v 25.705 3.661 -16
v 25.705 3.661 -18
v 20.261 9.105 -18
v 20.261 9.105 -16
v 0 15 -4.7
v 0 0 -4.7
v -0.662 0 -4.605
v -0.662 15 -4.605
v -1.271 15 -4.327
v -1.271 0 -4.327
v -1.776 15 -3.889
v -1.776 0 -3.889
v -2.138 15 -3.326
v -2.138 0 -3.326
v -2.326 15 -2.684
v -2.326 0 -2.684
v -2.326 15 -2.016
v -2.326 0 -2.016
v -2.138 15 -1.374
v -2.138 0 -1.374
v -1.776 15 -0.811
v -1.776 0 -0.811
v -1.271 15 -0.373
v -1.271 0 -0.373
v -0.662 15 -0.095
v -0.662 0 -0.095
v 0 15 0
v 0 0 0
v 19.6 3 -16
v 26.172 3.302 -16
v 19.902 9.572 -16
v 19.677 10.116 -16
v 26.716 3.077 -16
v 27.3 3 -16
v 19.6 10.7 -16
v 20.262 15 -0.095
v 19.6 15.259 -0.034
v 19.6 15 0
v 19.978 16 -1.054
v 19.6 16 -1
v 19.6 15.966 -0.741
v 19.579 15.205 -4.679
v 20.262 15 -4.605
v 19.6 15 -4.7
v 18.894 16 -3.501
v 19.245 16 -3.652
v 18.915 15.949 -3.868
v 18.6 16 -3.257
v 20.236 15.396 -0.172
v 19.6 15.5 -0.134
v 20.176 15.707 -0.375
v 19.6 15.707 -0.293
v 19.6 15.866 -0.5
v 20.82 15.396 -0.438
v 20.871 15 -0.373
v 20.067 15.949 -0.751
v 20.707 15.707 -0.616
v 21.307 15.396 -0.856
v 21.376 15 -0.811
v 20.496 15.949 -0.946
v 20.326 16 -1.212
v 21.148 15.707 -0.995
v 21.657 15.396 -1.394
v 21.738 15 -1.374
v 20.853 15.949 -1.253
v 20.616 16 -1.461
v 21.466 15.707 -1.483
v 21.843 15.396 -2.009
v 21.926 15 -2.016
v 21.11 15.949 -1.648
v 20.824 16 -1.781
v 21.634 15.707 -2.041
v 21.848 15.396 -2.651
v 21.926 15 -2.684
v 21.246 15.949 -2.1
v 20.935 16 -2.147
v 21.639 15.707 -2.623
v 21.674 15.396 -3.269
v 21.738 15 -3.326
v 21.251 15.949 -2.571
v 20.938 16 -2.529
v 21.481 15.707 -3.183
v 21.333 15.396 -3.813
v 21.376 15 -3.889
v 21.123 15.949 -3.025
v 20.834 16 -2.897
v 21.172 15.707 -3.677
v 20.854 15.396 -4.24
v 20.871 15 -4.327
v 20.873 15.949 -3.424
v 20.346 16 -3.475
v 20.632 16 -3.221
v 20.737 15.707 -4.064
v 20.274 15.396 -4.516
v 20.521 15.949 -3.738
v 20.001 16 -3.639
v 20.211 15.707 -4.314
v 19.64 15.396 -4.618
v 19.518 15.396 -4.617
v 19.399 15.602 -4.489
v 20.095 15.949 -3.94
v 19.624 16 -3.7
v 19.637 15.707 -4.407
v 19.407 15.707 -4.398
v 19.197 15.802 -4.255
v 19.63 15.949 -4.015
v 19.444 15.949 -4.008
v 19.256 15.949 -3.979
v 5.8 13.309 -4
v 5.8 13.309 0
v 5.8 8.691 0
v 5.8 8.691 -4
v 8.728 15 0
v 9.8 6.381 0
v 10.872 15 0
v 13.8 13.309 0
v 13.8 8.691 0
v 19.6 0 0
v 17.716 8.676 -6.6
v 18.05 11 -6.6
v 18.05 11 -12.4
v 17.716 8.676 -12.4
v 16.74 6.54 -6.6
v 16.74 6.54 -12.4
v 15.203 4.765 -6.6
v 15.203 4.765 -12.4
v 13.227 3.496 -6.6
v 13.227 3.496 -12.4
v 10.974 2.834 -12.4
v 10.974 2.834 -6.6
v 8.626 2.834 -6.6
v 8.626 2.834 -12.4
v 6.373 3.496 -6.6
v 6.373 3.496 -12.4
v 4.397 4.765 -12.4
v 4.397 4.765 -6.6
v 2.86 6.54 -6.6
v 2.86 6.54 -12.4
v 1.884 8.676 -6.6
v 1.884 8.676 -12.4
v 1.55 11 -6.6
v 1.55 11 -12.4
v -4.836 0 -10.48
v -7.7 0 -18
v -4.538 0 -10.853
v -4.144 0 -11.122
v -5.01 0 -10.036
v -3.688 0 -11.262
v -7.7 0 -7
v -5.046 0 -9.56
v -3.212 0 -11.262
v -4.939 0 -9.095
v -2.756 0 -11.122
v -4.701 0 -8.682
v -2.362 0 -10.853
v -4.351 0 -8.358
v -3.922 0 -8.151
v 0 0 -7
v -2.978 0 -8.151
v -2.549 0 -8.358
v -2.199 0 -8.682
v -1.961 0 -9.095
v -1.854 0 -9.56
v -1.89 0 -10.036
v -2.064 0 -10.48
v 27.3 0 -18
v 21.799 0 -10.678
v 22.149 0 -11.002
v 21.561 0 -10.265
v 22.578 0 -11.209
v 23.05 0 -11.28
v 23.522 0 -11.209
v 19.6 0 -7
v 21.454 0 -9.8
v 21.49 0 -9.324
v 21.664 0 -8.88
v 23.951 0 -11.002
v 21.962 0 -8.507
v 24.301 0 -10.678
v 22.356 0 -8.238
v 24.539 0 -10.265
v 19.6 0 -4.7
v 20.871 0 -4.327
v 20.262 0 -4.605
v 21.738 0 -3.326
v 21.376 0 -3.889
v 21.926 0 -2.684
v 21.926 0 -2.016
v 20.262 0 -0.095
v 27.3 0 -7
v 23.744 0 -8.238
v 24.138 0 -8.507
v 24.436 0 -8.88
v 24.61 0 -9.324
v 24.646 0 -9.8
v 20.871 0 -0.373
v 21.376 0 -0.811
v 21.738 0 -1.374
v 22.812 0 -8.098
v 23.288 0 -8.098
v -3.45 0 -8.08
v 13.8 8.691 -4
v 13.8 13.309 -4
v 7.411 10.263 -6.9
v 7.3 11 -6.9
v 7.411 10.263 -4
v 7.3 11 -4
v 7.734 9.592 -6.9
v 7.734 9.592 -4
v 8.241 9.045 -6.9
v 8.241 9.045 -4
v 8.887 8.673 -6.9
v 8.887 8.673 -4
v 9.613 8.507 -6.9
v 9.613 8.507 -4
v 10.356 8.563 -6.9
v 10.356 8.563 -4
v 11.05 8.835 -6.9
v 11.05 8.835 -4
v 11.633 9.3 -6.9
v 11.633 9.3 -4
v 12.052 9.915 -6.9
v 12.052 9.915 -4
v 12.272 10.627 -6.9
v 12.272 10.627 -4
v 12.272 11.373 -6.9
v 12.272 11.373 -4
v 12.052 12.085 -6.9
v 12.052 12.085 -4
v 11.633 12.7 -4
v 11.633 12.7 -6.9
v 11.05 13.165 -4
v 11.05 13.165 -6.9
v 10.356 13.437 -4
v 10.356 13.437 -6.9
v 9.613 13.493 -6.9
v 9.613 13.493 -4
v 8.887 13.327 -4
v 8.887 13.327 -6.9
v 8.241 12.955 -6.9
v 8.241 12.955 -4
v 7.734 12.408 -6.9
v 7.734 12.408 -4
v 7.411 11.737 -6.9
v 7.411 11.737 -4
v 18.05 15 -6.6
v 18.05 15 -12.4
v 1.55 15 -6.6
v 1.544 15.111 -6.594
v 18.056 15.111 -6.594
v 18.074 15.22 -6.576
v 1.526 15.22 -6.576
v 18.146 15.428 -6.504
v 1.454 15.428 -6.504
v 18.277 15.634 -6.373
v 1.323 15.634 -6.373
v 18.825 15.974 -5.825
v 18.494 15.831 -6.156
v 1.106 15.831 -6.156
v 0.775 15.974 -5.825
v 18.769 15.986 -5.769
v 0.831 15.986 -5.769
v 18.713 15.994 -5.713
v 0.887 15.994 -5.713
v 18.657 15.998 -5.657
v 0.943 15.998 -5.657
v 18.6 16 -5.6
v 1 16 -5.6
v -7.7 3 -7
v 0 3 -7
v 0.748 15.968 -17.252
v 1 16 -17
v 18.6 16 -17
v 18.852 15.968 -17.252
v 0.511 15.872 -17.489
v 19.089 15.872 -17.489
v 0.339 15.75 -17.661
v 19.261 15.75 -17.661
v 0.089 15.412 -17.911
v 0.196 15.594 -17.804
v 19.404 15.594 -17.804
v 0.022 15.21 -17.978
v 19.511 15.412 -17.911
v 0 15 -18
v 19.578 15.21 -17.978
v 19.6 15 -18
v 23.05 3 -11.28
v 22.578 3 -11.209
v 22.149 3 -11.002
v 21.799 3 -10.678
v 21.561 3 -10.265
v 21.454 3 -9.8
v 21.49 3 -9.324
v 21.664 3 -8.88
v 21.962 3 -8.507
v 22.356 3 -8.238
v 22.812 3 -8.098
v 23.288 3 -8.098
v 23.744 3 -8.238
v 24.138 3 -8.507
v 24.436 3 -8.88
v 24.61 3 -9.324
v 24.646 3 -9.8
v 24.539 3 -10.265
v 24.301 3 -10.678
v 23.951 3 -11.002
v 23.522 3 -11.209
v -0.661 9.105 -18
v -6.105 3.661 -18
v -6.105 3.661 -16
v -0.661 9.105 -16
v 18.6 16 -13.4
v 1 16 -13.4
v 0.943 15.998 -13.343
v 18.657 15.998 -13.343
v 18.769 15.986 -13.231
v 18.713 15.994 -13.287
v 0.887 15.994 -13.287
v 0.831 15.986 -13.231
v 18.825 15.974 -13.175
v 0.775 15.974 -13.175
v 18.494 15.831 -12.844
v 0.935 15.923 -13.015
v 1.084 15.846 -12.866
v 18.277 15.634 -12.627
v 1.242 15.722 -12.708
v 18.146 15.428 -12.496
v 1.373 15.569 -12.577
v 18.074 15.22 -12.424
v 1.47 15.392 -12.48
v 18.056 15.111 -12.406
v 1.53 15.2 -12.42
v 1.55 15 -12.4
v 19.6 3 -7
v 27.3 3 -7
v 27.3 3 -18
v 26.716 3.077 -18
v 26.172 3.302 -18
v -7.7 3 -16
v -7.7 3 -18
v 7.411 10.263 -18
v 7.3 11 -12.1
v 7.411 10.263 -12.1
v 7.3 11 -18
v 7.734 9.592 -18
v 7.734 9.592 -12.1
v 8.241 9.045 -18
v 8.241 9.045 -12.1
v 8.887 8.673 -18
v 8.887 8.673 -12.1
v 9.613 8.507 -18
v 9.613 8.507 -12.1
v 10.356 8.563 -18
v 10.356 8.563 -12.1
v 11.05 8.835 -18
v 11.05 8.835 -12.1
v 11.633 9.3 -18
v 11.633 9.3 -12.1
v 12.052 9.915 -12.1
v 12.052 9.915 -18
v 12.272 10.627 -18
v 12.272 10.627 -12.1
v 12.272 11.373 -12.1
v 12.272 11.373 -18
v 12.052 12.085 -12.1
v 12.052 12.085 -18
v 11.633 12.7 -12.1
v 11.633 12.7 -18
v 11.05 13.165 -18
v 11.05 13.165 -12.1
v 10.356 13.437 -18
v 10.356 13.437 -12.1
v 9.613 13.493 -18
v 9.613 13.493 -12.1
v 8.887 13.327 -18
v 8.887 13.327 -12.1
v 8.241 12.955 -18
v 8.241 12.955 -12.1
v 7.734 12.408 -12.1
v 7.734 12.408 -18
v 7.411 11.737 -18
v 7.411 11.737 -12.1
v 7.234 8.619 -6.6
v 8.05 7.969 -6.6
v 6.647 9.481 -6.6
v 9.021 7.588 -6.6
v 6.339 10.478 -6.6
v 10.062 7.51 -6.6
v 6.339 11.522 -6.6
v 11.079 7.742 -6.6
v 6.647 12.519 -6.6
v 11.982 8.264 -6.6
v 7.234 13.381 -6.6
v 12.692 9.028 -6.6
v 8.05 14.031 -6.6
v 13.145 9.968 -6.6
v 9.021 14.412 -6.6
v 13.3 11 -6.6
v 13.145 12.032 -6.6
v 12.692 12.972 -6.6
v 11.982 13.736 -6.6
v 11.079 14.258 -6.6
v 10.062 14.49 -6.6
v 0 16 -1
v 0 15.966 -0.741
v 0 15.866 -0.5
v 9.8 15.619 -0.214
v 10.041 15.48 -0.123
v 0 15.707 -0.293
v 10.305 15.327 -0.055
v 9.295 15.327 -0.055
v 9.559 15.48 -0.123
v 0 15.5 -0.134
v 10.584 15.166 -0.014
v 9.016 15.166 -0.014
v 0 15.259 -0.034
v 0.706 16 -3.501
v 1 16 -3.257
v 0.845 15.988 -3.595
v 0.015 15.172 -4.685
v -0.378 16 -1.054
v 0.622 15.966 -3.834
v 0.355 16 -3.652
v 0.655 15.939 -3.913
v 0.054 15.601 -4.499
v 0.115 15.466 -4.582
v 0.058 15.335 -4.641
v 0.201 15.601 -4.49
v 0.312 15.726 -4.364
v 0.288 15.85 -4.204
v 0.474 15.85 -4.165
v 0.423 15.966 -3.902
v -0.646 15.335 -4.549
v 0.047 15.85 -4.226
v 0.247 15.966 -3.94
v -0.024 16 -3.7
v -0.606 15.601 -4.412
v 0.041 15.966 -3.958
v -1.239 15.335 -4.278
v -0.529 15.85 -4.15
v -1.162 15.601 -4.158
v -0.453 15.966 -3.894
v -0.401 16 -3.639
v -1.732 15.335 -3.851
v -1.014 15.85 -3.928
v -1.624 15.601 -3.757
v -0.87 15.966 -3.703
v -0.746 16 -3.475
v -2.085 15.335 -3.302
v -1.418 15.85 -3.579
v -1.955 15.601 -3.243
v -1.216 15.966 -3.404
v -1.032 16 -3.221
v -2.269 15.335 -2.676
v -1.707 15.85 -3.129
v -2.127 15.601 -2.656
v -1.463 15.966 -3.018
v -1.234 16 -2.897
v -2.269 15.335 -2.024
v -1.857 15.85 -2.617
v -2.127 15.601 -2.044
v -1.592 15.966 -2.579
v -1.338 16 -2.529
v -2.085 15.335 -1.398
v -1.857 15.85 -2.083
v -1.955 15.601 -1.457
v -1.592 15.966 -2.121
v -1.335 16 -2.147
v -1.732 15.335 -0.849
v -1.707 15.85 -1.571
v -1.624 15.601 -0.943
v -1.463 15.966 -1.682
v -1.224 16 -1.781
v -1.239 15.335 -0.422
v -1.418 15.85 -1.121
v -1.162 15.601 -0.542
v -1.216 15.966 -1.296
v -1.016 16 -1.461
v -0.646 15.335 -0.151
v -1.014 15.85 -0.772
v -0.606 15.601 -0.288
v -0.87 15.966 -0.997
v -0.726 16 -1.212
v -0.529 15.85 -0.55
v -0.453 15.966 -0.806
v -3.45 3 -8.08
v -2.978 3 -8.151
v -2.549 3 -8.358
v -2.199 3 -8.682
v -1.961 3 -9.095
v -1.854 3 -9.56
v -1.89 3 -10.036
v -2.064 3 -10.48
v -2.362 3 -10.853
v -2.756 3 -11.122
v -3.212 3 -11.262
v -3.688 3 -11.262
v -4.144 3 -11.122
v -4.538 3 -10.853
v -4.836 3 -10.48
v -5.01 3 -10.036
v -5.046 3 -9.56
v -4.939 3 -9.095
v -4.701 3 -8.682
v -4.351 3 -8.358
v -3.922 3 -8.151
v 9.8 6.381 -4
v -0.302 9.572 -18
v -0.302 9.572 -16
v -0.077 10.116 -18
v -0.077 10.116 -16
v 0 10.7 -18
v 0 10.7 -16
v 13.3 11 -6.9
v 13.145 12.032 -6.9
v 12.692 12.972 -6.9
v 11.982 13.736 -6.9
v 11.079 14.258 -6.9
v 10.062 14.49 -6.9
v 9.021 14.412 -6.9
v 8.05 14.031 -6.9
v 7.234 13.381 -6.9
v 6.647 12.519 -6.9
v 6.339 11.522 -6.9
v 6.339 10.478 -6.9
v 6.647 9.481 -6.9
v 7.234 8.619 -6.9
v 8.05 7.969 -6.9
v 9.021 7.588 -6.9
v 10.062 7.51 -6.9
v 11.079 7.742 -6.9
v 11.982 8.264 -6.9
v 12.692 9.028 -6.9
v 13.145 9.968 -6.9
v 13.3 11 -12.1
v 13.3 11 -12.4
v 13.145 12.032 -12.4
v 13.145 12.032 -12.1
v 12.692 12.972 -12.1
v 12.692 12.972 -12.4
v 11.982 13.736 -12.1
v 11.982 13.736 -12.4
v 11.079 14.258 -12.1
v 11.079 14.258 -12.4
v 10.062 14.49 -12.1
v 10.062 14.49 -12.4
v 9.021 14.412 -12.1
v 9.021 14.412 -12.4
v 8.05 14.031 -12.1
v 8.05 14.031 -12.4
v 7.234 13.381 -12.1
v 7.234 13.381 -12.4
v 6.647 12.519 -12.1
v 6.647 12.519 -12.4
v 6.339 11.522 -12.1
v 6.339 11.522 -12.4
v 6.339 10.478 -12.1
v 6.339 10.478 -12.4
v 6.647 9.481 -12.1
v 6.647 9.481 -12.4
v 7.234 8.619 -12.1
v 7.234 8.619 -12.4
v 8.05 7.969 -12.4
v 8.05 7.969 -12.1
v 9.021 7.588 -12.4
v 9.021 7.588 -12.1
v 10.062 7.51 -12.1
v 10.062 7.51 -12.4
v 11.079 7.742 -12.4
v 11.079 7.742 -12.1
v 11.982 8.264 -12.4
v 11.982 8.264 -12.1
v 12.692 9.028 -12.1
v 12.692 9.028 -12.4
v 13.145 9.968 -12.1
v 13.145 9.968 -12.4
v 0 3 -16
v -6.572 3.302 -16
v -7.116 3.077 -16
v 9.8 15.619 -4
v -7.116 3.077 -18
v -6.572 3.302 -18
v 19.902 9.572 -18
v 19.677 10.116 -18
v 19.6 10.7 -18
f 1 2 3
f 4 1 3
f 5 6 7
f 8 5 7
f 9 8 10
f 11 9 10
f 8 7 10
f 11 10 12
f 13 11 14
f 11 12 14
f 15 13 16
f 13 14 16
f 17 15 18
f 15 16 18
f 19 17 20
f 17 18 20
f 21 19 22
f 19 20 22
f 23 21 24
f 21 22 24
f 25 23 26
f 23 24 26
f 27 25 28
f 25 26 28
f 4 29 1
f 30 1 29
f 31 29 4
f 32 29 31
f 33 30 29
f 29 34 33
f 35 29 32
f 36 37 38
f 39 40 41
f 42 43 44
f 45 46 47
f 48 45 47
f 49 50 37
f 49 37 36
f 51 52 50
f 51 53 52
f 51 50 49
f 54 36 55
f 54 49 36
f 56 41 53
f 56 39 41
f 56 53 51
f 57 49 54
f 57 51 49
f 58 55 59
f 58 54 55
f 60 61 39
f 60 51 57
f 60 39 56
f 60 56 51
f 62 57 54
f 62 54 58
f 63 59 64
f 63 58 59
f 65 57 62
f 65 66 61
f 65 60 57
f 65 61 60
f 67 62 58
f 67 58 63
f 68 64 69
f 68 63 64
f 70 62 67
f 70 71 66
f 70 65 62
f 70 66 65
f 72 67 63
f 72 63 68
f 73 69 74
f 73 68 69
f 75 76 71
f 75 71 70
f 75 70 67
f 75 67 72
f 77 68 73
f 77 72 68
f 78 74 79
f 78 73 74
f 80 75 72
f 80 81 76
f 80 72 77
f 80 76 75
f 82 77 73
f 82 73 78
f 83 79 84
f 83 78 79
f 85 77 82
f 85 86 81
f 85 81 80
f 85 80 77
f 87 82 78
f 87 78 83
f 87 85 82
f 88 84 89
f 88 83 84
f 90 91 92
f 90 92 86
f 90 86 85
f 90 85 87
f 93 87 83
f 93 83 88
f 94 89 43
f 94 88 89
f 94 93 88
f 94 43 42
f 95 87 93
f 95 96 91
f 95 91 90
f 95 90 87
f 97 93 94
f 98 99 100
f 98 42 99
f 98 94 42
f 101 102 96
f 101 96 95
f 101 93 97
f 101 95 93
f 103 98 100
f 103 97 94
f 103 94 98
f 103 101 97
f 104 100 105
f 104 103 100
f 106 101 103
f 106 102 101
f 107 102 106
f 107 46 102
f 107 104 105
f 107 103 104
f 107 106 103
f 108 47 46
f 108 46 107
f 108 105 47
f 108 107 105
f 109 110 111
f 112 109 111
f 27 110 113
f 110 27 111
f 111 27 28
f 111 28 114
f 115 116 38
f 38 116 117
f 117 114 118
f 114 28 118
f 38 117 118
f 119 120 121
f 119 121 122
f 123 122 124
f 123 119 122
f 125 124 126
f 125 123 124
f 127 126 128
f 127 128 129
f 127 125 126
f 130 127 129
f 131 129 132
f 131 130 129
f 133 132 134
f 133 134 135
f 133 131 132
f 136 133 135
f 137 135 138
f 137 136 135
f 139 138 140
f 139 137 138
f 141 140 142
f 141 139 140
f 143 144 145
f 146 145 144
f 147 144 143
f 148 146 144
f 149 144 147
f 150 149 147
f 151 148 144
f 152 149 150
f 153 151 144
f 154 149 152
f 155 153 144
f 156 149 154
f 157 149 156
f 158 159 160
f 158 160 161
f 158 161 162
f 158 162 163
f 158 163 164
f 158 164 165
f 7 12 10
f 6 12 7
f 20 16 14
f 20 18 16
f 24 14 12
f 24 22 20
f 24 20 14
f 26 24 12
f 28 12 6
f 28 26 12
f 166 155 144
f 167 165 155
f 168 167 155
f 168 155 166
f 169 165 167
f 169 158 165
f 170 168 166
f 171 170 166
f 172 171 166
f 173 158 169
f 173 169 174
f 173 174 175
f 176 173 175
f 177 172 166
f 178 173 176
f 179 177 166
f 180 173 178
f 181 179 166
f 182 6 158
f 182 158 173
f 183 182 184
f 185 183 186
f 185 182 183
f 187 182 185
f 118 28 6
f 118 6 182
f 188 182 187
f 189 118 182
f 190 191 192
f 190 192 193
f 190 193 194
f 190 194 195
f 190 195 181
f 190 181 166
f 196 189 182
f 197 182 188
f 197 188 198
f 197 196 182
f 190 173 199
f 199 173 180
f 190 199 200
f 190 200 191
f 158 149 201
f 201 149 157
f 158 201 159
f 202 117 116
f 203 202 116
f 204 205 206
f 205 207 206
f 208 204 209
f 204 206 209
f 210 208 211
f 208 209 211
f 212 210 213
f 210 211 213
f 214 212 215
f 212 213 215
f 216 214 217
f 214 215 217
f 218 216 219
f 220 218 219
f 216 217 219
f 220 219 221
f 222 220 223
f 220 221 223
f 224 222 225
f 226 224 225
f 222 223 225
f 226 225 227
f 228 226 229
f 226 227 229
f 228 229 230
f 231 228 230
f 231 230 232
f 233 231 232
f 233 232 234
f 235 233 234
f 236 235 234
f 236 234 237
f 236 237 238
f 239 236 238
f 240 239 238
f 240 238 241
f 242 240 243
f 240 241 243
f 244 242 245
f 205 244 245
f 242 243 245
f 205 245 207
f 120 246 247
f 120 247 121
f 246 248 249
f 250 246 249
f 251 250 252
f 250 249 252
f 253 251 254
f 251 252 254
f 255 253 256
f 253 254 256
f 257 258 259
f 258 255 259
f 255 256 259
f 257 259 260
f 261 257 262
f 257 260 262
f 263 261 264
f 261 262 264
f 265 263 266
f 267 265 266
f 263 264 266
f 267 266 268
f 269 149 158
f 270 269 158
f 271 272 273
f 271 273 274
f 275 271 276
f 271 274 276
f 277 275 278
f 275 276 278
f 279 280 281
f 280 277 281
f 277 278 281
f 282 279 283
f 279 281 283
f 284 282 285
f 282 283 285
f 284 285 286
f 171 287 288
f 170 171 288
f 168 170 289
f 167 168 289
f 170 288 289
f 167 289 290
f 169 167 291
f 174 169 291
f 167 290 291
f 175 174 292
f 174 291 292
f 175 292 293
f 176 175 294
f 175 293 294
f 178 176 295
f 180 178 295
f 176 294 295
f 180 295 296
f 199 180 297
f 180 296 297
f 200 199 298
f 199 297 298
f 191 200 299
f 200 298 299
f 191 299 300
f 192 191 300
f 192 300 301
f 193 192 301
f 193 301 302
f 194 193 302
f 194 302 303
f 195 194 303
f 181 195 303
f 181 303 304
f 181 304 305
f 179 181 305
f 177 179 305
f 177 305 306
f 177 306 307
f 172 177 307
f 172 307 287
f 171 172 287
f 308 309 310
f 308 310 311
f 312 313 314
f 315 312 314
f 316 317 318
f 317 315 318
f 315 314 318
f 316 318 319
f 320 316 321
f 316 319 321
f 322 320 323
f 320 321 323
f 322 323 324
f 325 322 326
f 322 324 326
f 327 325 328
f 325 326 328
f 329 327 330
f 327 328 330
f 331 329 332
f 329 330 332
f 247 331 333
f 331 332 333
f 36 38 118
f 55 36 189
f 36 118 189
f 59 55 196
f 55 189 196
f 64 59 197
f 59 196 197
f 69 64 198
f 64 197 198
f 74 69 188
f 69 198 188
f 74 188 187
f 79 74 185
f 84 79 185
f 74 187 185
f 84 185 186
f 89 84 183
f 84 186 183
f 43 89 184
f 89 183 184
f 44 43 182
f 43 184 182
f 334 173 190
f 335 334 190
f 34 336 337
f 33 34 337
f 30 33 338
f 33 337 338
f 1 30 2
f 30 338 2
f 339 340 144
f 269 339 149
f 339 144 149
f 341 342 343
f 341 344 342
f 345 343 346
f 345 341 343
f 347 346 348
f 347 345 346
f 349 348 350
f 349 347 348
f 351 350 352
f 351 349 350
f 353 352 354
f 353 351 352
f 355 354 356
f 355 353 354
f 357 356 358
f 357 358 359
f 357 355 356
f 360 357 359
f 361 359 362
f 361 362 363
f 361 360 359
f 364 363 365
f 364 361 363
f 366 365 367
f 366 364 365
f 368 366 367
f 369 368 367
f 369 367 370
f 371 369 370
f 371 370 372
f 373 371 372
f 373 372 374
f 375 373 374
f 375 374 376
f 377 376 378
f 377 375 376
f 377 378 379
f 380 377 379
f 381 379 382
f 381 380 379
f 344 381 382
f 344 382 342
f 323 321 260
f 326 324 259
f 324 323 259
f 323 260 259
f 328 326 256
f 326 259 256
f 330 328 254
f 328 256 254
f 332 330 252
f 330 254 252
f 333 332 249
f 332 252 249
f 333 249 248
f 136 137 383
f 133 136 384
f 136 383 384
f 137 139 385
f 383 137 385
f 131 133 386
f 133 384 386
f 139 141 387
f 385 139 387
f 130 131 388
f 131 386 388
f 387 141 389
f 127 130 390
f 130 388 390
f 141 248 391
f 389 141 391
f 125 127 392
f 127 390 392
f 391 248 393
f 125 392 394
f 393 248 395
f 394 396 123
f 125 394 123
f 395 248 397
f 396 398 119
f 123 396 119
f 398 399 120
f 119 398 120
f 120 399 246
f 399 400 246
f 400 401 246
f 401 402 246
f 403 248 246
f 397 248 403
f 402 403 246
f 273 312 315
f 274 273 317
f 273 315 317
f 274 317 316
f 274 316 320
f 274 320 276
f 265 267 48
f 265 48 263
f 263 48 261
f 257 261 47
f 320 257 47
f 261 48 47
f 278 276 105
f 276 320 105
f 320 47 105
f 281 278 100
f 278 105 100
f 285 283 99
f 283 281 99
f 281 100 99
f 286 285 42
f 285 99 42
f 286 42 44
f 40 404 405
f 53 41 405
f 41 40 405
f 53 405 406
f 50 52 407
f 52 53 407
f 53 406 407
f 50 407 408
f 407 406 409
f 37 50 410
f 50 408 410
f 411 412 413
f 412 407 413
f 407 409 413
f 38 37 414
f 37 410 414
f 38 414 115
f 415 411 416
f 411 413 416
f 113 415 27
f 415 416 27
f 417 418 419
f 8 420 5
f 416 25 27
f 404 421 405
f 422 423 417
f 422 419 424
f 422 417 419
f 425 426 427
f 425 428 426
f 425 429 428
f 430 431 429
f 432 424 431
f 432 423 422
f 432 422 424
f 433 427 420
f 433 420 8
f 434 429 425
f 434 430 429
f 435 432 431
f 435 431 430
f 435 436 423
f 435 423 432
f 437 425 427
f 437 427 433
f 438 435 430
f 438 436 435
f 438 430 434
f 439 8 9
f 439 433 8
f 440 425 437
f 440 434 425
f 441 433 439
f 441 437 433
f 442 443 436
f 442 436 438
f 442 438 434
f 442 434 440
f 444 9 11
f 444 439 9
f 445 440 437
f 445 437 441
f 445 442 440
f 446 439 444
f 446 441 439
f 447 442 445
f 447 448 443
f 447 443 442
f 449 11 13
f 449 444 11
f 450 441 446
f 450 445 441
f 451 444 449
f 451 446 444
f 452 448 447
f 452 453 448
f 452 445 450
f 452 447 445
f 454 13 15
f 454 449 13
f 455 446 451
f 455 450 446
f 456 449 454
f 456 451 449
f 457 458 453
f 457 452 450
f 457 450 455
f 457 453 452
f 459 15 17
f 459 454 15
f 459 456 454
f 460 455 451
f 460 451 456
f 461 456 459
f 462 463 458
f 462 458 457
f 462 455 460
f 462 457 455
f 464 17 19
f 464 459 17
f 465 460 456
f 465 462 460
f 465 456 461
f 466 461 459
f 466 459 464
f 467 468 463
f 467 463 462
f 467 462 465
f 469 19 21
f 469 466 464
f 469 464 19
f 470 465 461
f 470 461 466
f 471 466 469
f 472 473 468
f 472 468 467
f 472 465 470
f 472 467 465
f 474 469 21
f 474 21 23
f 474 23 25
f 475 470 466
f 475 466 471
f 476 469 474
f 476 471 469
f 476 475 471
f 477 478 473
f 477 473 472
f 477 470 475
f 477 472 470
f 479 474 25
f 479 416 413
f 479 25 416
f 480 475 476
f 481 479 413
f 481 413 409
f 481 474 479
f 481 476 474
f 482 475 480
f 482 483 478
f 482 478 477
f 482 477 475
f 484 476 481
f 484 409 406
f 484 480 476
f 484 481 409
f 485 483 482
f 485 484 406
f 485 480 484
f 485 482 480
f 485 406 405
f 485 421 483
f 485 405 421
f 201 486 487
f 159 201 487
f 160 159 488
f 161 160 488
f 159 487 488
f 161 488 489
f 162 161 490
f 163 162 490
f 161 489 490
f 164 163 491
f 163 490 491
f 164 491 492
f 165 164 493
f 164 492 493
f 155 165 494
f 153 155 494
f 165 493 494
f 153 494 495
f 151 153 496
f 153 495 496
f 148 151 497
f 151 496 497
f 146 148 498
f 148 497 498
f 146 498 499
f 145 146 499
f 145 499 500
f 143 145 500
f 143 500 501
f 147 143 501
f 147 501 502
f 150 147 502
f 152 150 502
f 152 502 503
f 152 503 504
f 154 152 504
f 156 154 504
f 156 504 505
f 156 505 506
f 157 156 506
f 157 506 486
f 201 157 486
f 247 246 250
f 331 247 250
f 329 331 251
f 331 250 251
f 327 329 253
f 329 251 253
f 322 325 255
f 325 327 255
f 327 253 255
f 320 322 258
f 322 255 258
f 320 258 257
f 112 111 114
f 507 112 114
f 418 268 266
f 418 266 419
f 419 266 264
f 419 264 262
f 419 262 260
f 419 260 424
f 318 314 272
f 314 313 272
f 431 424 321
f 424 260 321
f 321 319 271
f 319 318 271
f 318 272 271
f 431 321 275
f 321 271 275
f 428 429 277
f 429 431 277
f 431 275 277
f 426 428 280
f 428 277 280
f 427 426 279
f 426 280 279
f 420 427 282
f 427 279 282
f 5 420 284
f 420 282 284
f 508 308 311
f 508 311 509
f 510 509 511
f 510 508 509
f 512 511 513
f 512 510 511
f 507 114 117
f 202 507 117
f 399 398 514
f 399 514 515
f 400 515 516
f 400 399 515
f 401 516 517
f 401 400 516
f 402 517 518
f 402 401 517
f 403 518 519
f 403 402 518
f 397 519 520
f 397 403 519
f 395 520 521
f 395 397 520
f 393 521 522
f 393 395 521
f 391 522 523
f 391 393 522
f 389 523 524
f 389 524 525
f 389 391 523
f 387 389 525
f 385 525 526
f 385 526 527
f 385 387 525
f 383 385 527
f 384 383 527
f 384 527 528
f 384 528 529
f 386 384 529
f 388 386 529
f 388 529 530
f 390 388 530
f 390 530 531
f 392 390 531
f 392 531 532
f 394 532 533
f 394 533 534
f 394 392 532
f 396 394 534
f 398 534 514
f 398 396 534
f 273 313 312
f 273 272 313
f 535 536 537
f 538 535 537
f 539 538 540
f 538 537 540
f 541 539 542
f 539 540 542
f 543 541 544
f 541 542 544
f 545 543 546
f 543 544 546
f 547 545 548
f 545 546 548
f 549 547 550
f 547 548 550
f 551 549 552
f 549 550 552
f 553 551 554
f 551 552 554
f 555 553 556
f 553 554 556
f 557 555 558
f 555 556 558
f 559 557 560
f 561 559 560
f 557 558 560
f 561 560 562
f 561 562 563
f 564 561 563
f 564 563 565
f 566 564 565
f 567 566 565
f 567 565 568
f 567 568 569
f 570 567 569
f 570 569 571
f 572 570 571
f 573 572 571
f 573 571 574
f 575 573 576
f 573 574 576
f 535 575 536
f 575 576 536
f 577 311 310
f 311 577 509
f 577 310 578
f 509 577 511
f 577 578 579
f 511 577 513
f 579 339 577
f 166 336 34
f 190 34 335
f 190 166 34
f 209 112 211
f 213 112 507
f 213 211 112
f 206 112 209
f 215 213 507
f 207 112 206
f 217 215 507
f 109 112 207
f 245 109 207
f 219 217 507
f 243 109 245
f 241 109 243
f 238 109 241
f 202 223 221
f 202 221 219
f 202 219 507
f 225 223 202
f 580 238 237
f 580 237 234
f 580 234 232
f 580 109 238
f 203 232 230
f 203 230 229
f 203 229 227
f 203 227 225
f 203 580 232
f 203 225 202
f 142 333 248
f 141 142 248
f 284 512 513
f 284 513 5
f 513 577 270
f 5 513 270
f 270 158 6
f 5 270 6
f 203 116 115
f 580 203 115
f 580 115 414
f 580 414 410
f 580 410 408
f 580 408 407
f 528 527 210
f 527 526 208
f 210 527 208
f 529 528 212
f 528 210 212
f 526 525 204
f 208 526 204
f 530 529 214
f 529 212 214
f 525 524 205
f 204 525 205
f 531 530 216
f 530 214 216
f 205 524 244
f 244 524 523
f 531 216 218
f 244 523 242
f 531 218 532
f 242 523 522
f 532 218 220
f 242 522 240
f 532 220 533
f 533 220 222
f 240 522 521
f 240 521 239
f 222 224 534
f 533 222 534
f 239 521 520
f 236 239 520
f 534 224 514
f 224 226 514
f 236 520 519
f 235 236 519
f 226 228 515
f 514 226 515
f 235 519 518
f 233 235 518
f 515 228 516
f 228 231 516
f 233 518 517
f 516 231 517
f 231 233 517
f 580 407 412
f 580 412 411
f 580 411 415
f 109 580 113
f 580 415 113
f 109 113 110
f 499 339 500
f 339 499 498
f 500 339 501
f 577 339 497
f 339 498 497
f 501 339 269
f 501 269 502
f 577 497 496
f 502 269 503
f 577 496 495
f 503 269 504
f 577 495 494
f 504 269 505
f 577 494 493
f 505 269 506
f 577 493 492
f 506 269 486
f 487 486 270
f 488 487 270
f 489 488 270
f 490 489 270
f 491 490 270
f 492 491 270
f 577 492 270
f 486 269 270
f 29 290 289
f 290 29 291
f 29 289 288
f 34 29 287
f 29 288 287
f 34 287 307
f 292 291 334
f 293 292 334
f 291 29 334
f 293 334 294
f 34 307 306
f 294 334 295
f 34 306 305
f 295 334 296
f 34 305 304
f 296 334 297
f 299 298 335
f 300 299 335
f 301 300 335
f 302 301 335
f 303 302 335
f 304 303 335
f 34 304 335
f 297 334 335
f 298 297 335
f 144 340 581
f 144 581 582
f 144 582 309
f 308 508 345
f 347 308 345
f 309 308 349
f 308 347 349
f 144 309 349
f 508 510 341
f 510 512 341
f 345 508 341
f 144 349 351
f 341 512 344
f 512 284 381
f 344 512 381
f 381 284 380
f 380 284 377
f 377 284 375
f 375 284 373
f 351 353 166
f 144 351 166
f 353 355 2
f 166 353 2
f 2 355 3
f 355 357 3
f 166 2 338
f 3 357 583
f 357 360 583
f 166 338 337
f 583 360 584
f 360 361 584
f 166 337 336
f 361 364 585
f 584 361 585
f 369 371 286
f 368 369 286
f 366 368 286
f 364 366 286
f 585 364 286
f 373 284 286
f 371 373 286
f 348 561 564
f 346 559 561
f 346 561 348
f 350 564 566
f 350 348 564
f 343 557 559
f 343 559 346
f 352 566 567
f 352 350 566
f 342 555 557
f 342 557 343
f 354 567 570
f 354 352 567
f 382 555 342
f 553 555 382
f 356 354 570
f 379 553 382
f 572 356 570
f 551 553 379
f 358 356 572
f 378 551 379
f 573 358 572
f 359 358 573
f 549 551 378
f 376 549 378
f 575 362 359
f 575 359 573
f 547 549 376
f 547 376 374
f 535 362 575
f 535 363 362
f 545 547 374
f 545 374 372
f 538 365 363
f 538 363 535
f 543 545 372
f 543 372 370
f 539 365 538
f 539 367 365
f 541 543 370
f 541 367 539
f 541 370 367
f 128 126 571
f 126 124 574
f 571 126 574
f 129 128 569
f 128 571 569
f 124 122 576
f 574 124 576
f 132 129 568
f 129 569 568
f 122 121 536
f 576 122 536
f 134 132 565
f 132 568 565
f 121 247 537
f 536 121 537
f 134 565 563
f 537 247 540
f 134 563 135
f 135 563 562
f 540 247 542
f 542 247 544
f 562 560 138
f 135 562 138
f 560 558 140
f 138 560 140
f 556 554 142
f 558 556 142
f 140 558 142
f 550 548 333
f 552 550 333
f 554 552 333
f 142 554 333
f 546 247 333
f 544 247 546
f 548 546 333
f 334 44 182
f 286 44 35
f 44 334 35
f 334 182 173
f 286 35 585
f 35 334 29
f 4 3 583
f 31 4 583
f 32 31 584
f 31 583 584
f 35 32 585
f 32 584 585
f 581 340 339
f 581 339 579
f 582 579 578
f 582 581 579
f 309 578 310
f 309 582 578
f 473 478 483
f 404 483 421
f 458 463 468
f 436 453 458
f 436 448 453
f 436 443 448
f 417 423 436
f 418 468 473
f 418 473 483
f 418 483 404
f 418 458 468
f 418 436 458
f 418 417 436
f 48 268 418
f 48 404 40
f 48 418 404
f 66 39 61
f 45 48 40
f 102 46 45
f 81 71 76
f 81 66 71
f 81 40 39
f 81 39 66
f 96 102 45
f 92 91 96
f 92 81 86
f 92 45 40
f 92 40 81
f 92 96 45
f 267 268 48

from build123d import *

# Parameters (mm, degrees)
BOSS_EXTRUDE1_DEPTH            = 16
CUT_EXTRUDE4_START             = -6.6
CUT_EXTRUDE4_DEPTH             = 5.8
CUT_EXTRUDE5_REACH             = 34.585
SKETCH6_R                      = 2.5
CUT_EXTRUDE6_DEPTH             = 4
SKETCH8_R                      = 3.5
SKETCH8_R_2                    = 2.5
BOSS_EXTRUDE2_DEPTH            = 0.3
SKETCH9_W                      = 7.7
SKETCH9_H                      = 11
BOSS_EXTRUDE3_DEPTH            = 3
CUT_EXTRUDE7_REACH             = 37.189
SKETCH10_R                     = 1.6
CUT_EXTRUDE7_DIRECTION_2_DEPTH = 36.189344978
BOSS_EXTRUDE4_DEPTH            = 2
FILLET1_R                      = 1


with BuildPart() as part:
    # Sketch1 → Boss-Extrude1 (new body)
    with BuildSketch(Plane(origin=(0, 0, 0), x_dir=(1, 0, 0), z_dir=(0, 1, 0))):
        with BuildLine():
            Line((0, 0), (19.6, 0))
            ThreePointArc((19.6, 0), (21.95, 2.35), (19.6, 4.7))
            Line((19.6, 4.7), (19.6, 18))
            Line((19.6, 18), (0, 18))
            Line((0, 18), (0, 4.7))
            ThreePointArc((0, 4.7), (-2.35, 2.35), (0, 0))
        make_face()
    extrude(amount=BOSS_EXTRUDE1_DEPTH)

    # Sketch5 → Cut-Extrude4 (cut)
    with BuildSketch(Plane.XY.offset(CUT_EXTRUDE4_START)):
        with BuildLine():
            Line((1.55, 11), (1.55, 16))
            Line((1.55, 16), (18.05, 16))
            Line((18.05, 16), (18.05, 11))
            ThreePointArc((18.05, 11), (9.8, 2.75), (1.55, 11))
        make_face()
    extrude(amount=-CUT_EXTRUDE4_DEPTH, mode=Mode.SUBTRACT)

    # Cut-Extrude5: up to this face of the body (flat: up to its plane)
    cut_extrude5_end = Plane(part.part.faces().sort_by_distance((9.8, 8, 0))[0])
    # Sketch6 → Cut-Extrude5 (cut, up to the picked face)
    with BuildSketch(Plane(origin=(0, 0, -18), x_dir=(-1, 0, 0), z_dir=(0, 0, -1)), mode=Mode.PRIVATE) as cut_extrude5_sk1:
        with Locations((-9.8, 11)):
            Circle(SKETCH6_R)
    cut_extrude5_tool1 = split(extrude(cut_extrude5_sk1.sketch, amount=-CUT_EXTRUDE5_REACH, mode=Mode.PRIVATE), bisect_by=cut_extrude5_end, keep=Keep.BOTH, mode=Mode.PRIVATE)
    add(cut_extrude5_tool1.solids().sort_by(Axis((9.8, 11, -18), (0, 0, 1)))[0], mode=Mode.SUBTRACT)

    # Sketch7 → Cut-Extrude6 (cut)
    with BuildSketch(Plane.XY):
        Polygon((9.8, 15.618802154), (5.8, 13.309401077), (5.8, 8.690598923), (9.8, 6.381197846), (13.8, 8.690598923), (13.8, 13.309401077), align=None)
    extrude(amount=-CUT_EXTRUDE6_DEPTH, mode=Mode.SUBTRACT)

    # Sketch8 → Boss-Extrude2 (add)
    with BuildSketch(Plane.XY.offset(-12.4)):
        with Locations((9.8, 11)):
            Circle(SKETCH8_R)
        with Locations(Location((9.8, 11, 0), (0, 0, 180))):
            Circle(SKETCH8_R_2, mode=Mode.SUBTRACT)
    boss_extrude2 = extrude(amount=BOSS_EXTRUDE2_DEPTH)

    # Mirror1: Boss-Extrude2 across plane
    add(boss_extrude2.mirror(Plane.XY.offset(-9.5)))

    # Sketch9 → Boss-Extrude3 (add)
    with BuildSketch(Plane.XZ):
        with Locations((-3.85, -12.5)):
            Rectangle(SKETCH9_W, SKETCH9_H)
        with Locations((23.45, -12.5)):
            Rectangle(SKETCH9_W, SKETCH9_H)
    extrude(amount=-BOSS_EXTRUDE3_DEPTH)

    # Sketch10 → Cut-Extrude7 (cut, up to next)
    with BuildSketch(Plane(origin=(0, 3, 0), x_dir=(1, 0, 0), z_dir=(0, 1, 0)), mode=Mode.PRIVATE) as cut_extrude7_sk1:
        with Locations(Location((-3.45, 9.68, 0), (0, 0, 270))):
            Circle(SKETCH10_R)
    cut_extrude7_tool1 = extrude(cut_extrude7_sk1.sketch, amount=-CUT_EXTRUDE7_REACH, mode=Mode.PRIVATE) & part.part
    # Sketch10 → Cut-Extrude7 (cut, up to next)
    with BuildSketch(Plane(origin=(0, 3, 0), x_dir=(1, 0, 0), z_dir=(0, 1, 0)), mode=Mode.PRIVATE) as cut_extrude7_sk2:
        with Locations(Location((23.05, 9.68, 0), (0, 0, 90))):
            Circle(SKETCH10_R)
    cut_extrude7_tool2 = extrude(cut_extrude7_sk2.sketch, amount=-CUT_EXTRUDE7_REACH, mode=Mode.PRIVATE) & part.part
    add(cut_extrude7_tool1.solids().sort_by_distance((-3.45, 3, -9.68))[0], mode=Mode.SUBTRACT)
    add(cut_extrude7_tool2.solids().sort_by_distance((23.05, 3, -9.68))[0], mode=Mode.SUBTRACT)

    # Sketch10 → Cut-Extrude7 direction 2 (cut)
    with BuildSketch(Plane(origin=(0, 3, 0), x_dir=(1, 0, 0), z_dir=(0, 1, 0))):
        with Locations(Location((-3.45, 9.68, 0), (0, 0, 270))):
            Circle(SKETCH10_R)
        with Locations(Location((23.05, 9.68, 0), (0, 0, 90))):
            Circle(SKETCH10_R)
    extrude(amount=CUT_EXTRUDE7_DIRECTION_2_DEPTH, mode=Mode.SUBTRACT)

    # Sketch12 → Boss-Extrude4 (add)
    with BuildSketch(Plane(origin=(0, 0, -18), x_dir=(-1, 0, 0), z_dir=(0, 0, -1))):
        with BuildLine():
            Line((-19.6, 3), (-27.3, 3))
            ThreePointArc((-27.3, 3), (-26.436942556, 3.171672799), (-25.705277785, 3.66055557))
            Line((-25.705277785, 3.66055557), (-20.26055557, 9.105277785))
            ThreePointArc((-20.26055557, 9.105277785), (-19.771672799, 9.836942556), (-19.6, 10.7))
            Line((-19.6, 10.7), (-19.6, 3))
        make_face()
        with BuildLine():
            Line((0, 10.7), (0, 3))
            Line((0, 3), (7.7, 3))
            ThreePointArc((7.7, 3), (6.836942556, 3.171672799), (6.105277785, 3.66055557))
            Line((6.105277785, 3.66055557), (0.66055557, 9.105277785))
            ThreePointArc((0.66055557, 9.105277785), (0.171672799, 9.836942556), (0, 10.7))
        make_face()
    extrude(amount=-BOSS_EXTRUDE4_DEPTH)

    # Fillet1
    # the kernel refuses this fillet: 1 mm, written as the material it takes off along each edge
    with BuildSketch(Plane(origin=(19.6, 16, -2.35), x_dir=(0, 0, 1), z_dir=(-1, 0, 0))) as fillet1_piece_1:
        with BuildLine():
            CenterArc((2.35 - FILLET1_R, -FILLET1_R), FILLET1_R, 0, 90)
            Line((2.35, -FILLET1_R), (2.35, 0))
            Line((2.35, 0), (2.35 - FILLET1_R, 0))
        make_face()
    revolve(axis=Axis((19.6, 16, -2.35), (0, 1, 0)), revolution_arc=180, mode=Mode.SUBTRACT)
    with BuildSketch(Plane(origin=(19.6, 16, -2.2), x_dir=(-1, 0, 0), z_dir=(0, 0, -1))) as fillet1_piece_2_section:
        with BuildLine():
            CenterArc((FILLET1_R, -FILLET1_R), FILLET1_R, 90, 90)
            Line((0, -FILLET1_R), (0, 0))
            Line((0, 0), (FILLET1_R, 0))
        make_face()
    fillet1_piece_2 = extrude(amount=18.3, mode=Mode.PRIVATE)
    fillet1_piece_2 = fillet1_piece_2 - Plane(origin=(19.6, 15.773826921, -2.35), x_dir=(0, 0, 1), z_dir=(0, -1, 0)) * Cylinder(2.35, 41, mode=Mode.PRIVATE)
    add(fillet1_piece_2, mode=Mode.SUBTRACT)
    with BuildSketch(Plane(origin=(22.1, 16, -18), x_dir=(0, 0, 1), z_dir=(-1, 0, 0))) as fillet1_piece_3:
        with BuildLine():
            CenterArc((FILLET1_R, -FILLET1_R), FILLET1_R, 90, 90)
            Line((0, -FILLET1_R), (0, 0))
            Line((0, 0), (FILLET1_R, 0))
        make_face()
    extrude(amount=24.6, mode=Mode.SUBTRACT)
    with BuildSketch(Plane(origin=(0, 16, -20.5), x_dir=(1, 0, 0), z_dir=(0, 0, 1))) as fillet1_piece_4_section:
        with BuildLine():
            CenterArc((FILLET1_R, -FILLET1_R), FILLET1_R, 90, 90)
            Line((0, -FILLET1_R), (0, 0))
            Line((0, 0), (FILLET1_R, 0))
        make_face()
    fillet1_piece_4 = extrude(amount=18.3, mode=Mode.PRIVATE)
    fillet1_piece_4 = fillet1_piece_4 - Plane(origin=(0, 15.773826886, -2.35), x_dir=(0, 0, -1), z_dir=(0, -1, 0)) * Cylinder(2.35, 41, mode=Mode.PRIVATE)
    add(fillet1_piece_4, mode=Mode.SUBTRACT)
    with BuildSketch(Plane(origin=(1.55, 16, -12.4), x_dir=(0, 0, -1), z_dir=(1, 0, 0))) as fillet1_piece_5:
        with BuildLine():
            CenterArc((FILLET1_R, -FILLET1_R), FILLET1_R, 90, 90)
            Line((0, -FILLET1_R), (0, 0))
            Line((0, 0), (FILLET1_R, 0))
        make_face()
    extrude(amount=16.5, mode=Mode.SUBTRACT)
    with BuildSketch(Plane(origin=(1.55, 16, -6.6), x_dir=(-1, 0, 0), z_dir=(0, 0, -1))) as fillet1_piece_6:
        with BuildLine():
            CenterArc((FILLET1_R, -FILLET1_R), FILLET1_R, 90, 90)
            Line((0, -FILLET1_R), (0, 0))
            Line((0, 0), (FILLET1_R, 0))
        make_face()
    extrude(amount=5.8, mode=Mode.SUBTRACT)
    with BuildSketch(Plane(origin=(18.05, 16, -6.6), x_dir=(1, 0, 0), z_dir=(0, 0, -1))) as fillet1_piece_7:
        with BuildLine():
            CenterArc((FILLET1_R, FILLET1_R), FILLET1_R, 180, 90)
            Line((0, FILLET1_R), (0, 0))
            Line((0, 0), (FILLET1_R, 0))
        make_face()
    extrude(amount=5.8, mode=Mode.SUBTRACT)
    with BuildSketch(Plane(origin=(1.55, 16, -6.6), x_dir=(0, 0, 1), z_dir=(1, 0, 0))) as fillet1_piece_8:
        with BuildLine():
            CenterArc((FILLET1_R, FILLET1_R), FILLET1_R, 180, 90)
            Line((0, FILLET1_R), (0, 0))
            Line((0, 0), (FILLET1_R, 0))
        make_face()
    extrude(amount=16.5, mode=Mode.SUBTRACT)
    with BuildSketch(Plane(origin=(0, 16, -2.35), x_dir=(0, 0, -1), z_dir=(1, 0, 0))) as fillet1_piece_9:
        with BuildLine():
            CenterArc((2.35 - FILLET1_R, -FILLET1_R), FILLET1_R, 0, 90)
            Line((2.35 - FILLET1_R, 0), (2.35, 0))
            Line((2.35, 0), (2.35, -FILLET1_R))
        make_face()
    revolve(axis=Axis((0, 16, -2.35), (0, 1, 0)), revolution_arc=180, mode=Mode.SUBTRACT)
    with BuildSketch(Plane(origin=(0, 16, 0), x_dir=(0, -1, 0), z_dir=(1, 0, 0))) as fillet1_piece_10:
        with BuildLine():
            CenterArc((FILLET1_R, FILLET1_R), FILLET1_R, 180, 90)
            Line((0, FILLET1_R), (0, 0))
            Line((0, 0), (FILLET1_R, 0))
        make_face()
    extrude(amount=19.6, mode=Mode.SUBTRACT)
    with BuildSketch(Plane(origin=(19.6, 16, -2.35), x_dir=(0, 0, 1), z_dir=(-1, 0, 0))) as fillet1_piece_11a_section:
        with BuildLine():
            CenterArc((2.35 - FILLET1_R, -FILLET1_R), FILLET1_R, 0, 90)
            Line((2.35, -FILLET1_R), (2.35, 0))
            Line((2.35, 0), (2.35 - FILLET1_R, 0))
        make_face()
    fillet1_piece_11a = revolve(axis=Axis((19.6, 16, -2.35), (0, 1, 0)), revolution_arc=241.050980809, mode=Mode.PRIVATE)
    fillet1_piece_11a = split(fillet1_piece_11a, bisect_by=Plane(origin=(19.6, 15.760675593, -4.111934827), z_dir=(-1, 0, 0)), keep=Keep.TOP, mode=Mode.PRIVATE)
    with BuildSketch(Plane(origin=(19.6, 16, -2.2), x_dir=(-1, 0, 0), z_dir=(0, 0, -1))) as fillet1_piece_11b_section:
        with BuildLine():
            CenterArc((FILLET1_R, -FILLET1_R), FILLET1_R, 90, 90)
            Line((0, -FILLET1_R), (0, 0))
            Line((0, 0), (FILLET1_R, 0))
        make_face()
    fillet1_piece_11b = extrude(amount=18.3, mode=Mode.PRIVATE)
    fillet1_piece_11b = fillet1_piece_11b & Plane(origin=(19.6, 15.772187807, -2.35), x_dir=(0, 0, 1), z_dir=(0, -1, 0)) * Cylinder(2.35, 41, mode=Mode.PRIVATE)
    fillet1_piece_11 = fillet1_piece_11a & fillet1_piece_11b
    add(fillet1_piece_11, mode=Mode.SUBTRACT)
    with BuildSketch(Plane(origin=(0, 16, -2.35), x_dir=(0.8750507362013609, 0, -0.4840312067144602), z_dir=(0.4840312067144602, 0, 0.8750507362013609))) as fillet1_piece_12a_section:
        with BuildLine():
            CenterArc((2.35 - FILLET1_R, -FILLET1_R), FILLET1_R, 0, 90)
            Line((2.35 - FILLET1_R, 0), (2.35, 0))
            Line((2.35, 0), (2.35, -FILLET1_R))
        make_face()
    fillet1_piece_12a = revolve(axis=Axis((0, 16, -2.35), (0, 1, 0)), revolution_arc=241.050980809, mode=Mode.PRIVATE)
    fillet1_piece_12a = split(fillet1_piece_12a, bisect_by=Plane(origin=(0, 15.760675593, -4.111934827), z_dir=(1, 0, 0)), keep=Keep.TOP, mode=Mode.PRIVATE)
    with BuildSketch(Plane(origin=(0, 16, -20.5), x_dir=(1, 0, 0), z_dir=(0, 0, 1))) as fillet1_piece_12b_section:
        with BuildLine():
            CenterArc((FILLET1_R, -FILLET1_R), FILLET1_R, 90, 90)
            Line((0, -FILLET1_R), (0, 0))
            Line((0, 0), (FILLET1_R, 0))
        make_face()
    fillet1_piece_12b = extrude(amount=18.3, mode=Mode.PRIVATE)
    fillet1_piece_12b = fillet1_piece_12b & Plane(origin=(0, 15.772187772, -2.35), x_dir=(0, 0, -1), z_dir=(0, -1, 0)) * Cylinder(2.35, 41, mode=Mode.PRIVATE)
    fillet1_piece_12 = fillet1_piece_12a & fillet1_piece_12b
    add(fillet1_piece_12, mode=Mode.SUBTRACT)
    with BuildSketch(Plane(origin=(-0.95, 16, -12.4), x_dir=(0, 0, -1), z_dir=(1, 0, 0))) as fillet1_piece_13a_section:
        with BuildLine():
            CenterArc((FILLET1_R, -FILLET1_R), FILLET1_R, 90, 90)
            Line((0, -FILLET1_R), (0, 0))
            Line((0, 0), (FILLET1_R, 0))
        make_face()
    fillet1_piece_13a = extrude(amount=19, mode=Mode.PRIVATE)
    fillet1_piece_13a = split(fillet1_piece_13a, bisect_by=Plane(origin=(1.55, 15.773604886, -12.626395114), z_dir=(-1, 0, 0)), keep=Keep.TOP, mode=Mode.PRIVATE)
    with BuildSketch(Plane(origin=(1.55, 16, -6.6), x_dir=(-1, 0, 0), z_dir=(0, 0, -1))) as fillet1_piece_13b_section:
        with BuildLine():
            CenterArc((FILLET1_R, -FILLET1_R), FILLET1_R, 90, 90)
            Line((0, -FILLET1_R), (0, 0))
            Line((0, 0), (FILLET1_R, 0))
        make_face()
    fillet1_piece_13b = extrude(amount=8.3, mode=Mode.PRIVATE)
    fillet1_piece_13b = split(fillet1_piece_13b, bisect_by=Plane(origin=(1.323604886, 15.773604886, -12.4), z_dir=(0, 0, -1)), keep=Keep.TOP, mode=Mode.PRIVATE)
    fillet1_piece_13 = fillet1_piece_13a & fillet1_piece_13b
    add(fillet1_piece_13, mode=Mode.SUBTRACT)
    with BuildSketch(Plane(origin=(18.05, 16, -6.6), x_dir=(1, 0, 0), z_dir=(0, 0, -1))) as fillet1_piece_14a_section:
        with BuildLine():
            CenterArc((FILLET1_R, FILLET1_R), FILLET1_R, 180, 90)
            Line((0, FILLET1_R), (0, 0))
            Line((0, 0), (FILLET1_R, 0))
        make_face()
    fillet1_piece_14a = extrude(amount=8.3, mode=Mode.PRIVATE)
    fillet1_piece_14a = split(fillet1_piece_14a, bisect_by=Plane(origin=(18.276395114, 15.773604886, -12.4), z_dir=(0, 0, -1)), keep=Keep.TOP, mode=Mode.PRIVATE)
    with BuildSketch(Plane(origin=(1.55, 16, -12.4), x_dir=(0, 0, -1), z_dir=(1, 0, 0))) as fillet1_piece_14b_section:
        with BuildLine():
            CenterArc((FILLET1_R, -FILLET1_R), FILLET1_R, 90, 90)
            Line((0, -FILLET1_R), (0, 0))
            Line((0, 0), (FILLET1_R, 0))
        make_face()
    fillet1_piece_14b = extrude(amount=19, mode=Mode.PRIVATE)
    fillet1_piece_14b = split(fillet1_piece_14b, bisect_by=Plane(origin=(18.05, 15.773604886, -12.626395114), z_dir=(1, 0, 0)), keep=Keep.TOP, mode=Mode.PRIVATE)
    fillet1_piece_14 = fillet1_piece_14a & fillet1_piece_14b
    add(fillet1_piece_14, mode=Mode.SUBTRACT)
    with BuildSketch(Plane(origin=(-0.95, 16, -6.6), x_dir=(0, 0, 1), z_dir=(1, 0, 0))) as fillet1_piece_15a_section:
        with BuildLine():
            CenterArc((FILLET1_R, FILLET1_R), FILLET1_R, 180, 90)
            Line((0, FILLET1_R), (0, 0))
            Line((0, 0), (FILLET1_R, 0))
        make_face()
    fillet1_piece_15a = extrude(amount=19, mode=Mode.PRIVATE)
    fillet1_piece_15a = split(fillet1_piece_15a, bisect_by=Plane(origin=(1.55, 15.773604886, -6.373604886), z_dir=(-1, 0, 0)), keep=Keep.TOP, mode=Mode.PRIVATE)
    with BuildSketch(Plane(origin=(1.55, 16, -4.1), x_dir=(-1, 0, 0), z_dir=(0, 0, -1))) as fillet1_piece_15b_section:
        with BuildLine():
            CenterArc((FILLET1_R, -FILLET1_R), FILLET1_R, 90, 90)
            Line((0, -FILLET1_R), (0, 0))
            Line((0, 0), (FILLET1_R, 0))
        make_face()
    fillet1_piece_15b = extrude(amount=8.3, mode=Mode.PRIVATE)
    fillet1_piece_15b = split(fillet1_piece_15b, bisect_by=Plane(origin=(1.323604886, 15.773604886, -6.6), z_dir=(0, 0, 1)), keep=Keep.TOP, mode=Mode.PRIVATE)
    fillet1_piece_15 = fillet1_piece_15a & fillet1_piece_15b
    add(fillet1_piece_15, mode=Mode.SUBTRACT)
    with BuildSketch(Plane(origin=(1.55, 16, -6.6), x_dir=(0, 0, 1), z_dir=(1, 0, 0))) as fillet1_piece_16a_section:
        with BuildLine():
            CenterArc((FILLET1_R, FILLET1_R), FILLET1_R, 180, 90)
            Line((0, FILLET1_R), (0, 0))
            Line((0, 0), (FILLET1_R, 0))
        make_face()
    fillet1_piece_16a = extrude(amount=19, mode=Mode.PRIVATE)
    fillet1_piece_16a = split(fillet1_piece_16a, bisect_by=Plane(origin=(18.05, 15.773604886, -6.373604886), z_dir=(1, 0, 0)), keep=Keep.TOP, mode=Mode.PRIVATE)
    with BuildSketch(Plane(origin=(18.05, 16, -4.1), x_dir=(1, 0, 0), z_dir=(0, 0, -1))) as fillet1_piece_16b_section:
        with BuildLine():
            CenterArc((FILLET1_R, FILLET1_R), FILLET1_R, 180, 90)
            Line((0, FILLET1_R), (0, 0))
            Line((0, 0), (FILLET1_R, 0))
        make_face()
    fillet1_piece_16b = extrude(amount=8.3, mode=Mode.PRIVATE)
    fillet1_piece_16b = split(fillet1_piece_16b, bisect_by=Plane(origin=(18.276395114, 15.773604886, -6.6), z_dir=(0, 0, 1)), keep=Keep.TOP, mode=Mode.PRIVATE)
    fillet1_piece_16 = fillet1_piece_16a & fillet1_piece_16b
    add(fillet1_piece_16, mode=Mode.SUBTRACT)


solid = part.part
